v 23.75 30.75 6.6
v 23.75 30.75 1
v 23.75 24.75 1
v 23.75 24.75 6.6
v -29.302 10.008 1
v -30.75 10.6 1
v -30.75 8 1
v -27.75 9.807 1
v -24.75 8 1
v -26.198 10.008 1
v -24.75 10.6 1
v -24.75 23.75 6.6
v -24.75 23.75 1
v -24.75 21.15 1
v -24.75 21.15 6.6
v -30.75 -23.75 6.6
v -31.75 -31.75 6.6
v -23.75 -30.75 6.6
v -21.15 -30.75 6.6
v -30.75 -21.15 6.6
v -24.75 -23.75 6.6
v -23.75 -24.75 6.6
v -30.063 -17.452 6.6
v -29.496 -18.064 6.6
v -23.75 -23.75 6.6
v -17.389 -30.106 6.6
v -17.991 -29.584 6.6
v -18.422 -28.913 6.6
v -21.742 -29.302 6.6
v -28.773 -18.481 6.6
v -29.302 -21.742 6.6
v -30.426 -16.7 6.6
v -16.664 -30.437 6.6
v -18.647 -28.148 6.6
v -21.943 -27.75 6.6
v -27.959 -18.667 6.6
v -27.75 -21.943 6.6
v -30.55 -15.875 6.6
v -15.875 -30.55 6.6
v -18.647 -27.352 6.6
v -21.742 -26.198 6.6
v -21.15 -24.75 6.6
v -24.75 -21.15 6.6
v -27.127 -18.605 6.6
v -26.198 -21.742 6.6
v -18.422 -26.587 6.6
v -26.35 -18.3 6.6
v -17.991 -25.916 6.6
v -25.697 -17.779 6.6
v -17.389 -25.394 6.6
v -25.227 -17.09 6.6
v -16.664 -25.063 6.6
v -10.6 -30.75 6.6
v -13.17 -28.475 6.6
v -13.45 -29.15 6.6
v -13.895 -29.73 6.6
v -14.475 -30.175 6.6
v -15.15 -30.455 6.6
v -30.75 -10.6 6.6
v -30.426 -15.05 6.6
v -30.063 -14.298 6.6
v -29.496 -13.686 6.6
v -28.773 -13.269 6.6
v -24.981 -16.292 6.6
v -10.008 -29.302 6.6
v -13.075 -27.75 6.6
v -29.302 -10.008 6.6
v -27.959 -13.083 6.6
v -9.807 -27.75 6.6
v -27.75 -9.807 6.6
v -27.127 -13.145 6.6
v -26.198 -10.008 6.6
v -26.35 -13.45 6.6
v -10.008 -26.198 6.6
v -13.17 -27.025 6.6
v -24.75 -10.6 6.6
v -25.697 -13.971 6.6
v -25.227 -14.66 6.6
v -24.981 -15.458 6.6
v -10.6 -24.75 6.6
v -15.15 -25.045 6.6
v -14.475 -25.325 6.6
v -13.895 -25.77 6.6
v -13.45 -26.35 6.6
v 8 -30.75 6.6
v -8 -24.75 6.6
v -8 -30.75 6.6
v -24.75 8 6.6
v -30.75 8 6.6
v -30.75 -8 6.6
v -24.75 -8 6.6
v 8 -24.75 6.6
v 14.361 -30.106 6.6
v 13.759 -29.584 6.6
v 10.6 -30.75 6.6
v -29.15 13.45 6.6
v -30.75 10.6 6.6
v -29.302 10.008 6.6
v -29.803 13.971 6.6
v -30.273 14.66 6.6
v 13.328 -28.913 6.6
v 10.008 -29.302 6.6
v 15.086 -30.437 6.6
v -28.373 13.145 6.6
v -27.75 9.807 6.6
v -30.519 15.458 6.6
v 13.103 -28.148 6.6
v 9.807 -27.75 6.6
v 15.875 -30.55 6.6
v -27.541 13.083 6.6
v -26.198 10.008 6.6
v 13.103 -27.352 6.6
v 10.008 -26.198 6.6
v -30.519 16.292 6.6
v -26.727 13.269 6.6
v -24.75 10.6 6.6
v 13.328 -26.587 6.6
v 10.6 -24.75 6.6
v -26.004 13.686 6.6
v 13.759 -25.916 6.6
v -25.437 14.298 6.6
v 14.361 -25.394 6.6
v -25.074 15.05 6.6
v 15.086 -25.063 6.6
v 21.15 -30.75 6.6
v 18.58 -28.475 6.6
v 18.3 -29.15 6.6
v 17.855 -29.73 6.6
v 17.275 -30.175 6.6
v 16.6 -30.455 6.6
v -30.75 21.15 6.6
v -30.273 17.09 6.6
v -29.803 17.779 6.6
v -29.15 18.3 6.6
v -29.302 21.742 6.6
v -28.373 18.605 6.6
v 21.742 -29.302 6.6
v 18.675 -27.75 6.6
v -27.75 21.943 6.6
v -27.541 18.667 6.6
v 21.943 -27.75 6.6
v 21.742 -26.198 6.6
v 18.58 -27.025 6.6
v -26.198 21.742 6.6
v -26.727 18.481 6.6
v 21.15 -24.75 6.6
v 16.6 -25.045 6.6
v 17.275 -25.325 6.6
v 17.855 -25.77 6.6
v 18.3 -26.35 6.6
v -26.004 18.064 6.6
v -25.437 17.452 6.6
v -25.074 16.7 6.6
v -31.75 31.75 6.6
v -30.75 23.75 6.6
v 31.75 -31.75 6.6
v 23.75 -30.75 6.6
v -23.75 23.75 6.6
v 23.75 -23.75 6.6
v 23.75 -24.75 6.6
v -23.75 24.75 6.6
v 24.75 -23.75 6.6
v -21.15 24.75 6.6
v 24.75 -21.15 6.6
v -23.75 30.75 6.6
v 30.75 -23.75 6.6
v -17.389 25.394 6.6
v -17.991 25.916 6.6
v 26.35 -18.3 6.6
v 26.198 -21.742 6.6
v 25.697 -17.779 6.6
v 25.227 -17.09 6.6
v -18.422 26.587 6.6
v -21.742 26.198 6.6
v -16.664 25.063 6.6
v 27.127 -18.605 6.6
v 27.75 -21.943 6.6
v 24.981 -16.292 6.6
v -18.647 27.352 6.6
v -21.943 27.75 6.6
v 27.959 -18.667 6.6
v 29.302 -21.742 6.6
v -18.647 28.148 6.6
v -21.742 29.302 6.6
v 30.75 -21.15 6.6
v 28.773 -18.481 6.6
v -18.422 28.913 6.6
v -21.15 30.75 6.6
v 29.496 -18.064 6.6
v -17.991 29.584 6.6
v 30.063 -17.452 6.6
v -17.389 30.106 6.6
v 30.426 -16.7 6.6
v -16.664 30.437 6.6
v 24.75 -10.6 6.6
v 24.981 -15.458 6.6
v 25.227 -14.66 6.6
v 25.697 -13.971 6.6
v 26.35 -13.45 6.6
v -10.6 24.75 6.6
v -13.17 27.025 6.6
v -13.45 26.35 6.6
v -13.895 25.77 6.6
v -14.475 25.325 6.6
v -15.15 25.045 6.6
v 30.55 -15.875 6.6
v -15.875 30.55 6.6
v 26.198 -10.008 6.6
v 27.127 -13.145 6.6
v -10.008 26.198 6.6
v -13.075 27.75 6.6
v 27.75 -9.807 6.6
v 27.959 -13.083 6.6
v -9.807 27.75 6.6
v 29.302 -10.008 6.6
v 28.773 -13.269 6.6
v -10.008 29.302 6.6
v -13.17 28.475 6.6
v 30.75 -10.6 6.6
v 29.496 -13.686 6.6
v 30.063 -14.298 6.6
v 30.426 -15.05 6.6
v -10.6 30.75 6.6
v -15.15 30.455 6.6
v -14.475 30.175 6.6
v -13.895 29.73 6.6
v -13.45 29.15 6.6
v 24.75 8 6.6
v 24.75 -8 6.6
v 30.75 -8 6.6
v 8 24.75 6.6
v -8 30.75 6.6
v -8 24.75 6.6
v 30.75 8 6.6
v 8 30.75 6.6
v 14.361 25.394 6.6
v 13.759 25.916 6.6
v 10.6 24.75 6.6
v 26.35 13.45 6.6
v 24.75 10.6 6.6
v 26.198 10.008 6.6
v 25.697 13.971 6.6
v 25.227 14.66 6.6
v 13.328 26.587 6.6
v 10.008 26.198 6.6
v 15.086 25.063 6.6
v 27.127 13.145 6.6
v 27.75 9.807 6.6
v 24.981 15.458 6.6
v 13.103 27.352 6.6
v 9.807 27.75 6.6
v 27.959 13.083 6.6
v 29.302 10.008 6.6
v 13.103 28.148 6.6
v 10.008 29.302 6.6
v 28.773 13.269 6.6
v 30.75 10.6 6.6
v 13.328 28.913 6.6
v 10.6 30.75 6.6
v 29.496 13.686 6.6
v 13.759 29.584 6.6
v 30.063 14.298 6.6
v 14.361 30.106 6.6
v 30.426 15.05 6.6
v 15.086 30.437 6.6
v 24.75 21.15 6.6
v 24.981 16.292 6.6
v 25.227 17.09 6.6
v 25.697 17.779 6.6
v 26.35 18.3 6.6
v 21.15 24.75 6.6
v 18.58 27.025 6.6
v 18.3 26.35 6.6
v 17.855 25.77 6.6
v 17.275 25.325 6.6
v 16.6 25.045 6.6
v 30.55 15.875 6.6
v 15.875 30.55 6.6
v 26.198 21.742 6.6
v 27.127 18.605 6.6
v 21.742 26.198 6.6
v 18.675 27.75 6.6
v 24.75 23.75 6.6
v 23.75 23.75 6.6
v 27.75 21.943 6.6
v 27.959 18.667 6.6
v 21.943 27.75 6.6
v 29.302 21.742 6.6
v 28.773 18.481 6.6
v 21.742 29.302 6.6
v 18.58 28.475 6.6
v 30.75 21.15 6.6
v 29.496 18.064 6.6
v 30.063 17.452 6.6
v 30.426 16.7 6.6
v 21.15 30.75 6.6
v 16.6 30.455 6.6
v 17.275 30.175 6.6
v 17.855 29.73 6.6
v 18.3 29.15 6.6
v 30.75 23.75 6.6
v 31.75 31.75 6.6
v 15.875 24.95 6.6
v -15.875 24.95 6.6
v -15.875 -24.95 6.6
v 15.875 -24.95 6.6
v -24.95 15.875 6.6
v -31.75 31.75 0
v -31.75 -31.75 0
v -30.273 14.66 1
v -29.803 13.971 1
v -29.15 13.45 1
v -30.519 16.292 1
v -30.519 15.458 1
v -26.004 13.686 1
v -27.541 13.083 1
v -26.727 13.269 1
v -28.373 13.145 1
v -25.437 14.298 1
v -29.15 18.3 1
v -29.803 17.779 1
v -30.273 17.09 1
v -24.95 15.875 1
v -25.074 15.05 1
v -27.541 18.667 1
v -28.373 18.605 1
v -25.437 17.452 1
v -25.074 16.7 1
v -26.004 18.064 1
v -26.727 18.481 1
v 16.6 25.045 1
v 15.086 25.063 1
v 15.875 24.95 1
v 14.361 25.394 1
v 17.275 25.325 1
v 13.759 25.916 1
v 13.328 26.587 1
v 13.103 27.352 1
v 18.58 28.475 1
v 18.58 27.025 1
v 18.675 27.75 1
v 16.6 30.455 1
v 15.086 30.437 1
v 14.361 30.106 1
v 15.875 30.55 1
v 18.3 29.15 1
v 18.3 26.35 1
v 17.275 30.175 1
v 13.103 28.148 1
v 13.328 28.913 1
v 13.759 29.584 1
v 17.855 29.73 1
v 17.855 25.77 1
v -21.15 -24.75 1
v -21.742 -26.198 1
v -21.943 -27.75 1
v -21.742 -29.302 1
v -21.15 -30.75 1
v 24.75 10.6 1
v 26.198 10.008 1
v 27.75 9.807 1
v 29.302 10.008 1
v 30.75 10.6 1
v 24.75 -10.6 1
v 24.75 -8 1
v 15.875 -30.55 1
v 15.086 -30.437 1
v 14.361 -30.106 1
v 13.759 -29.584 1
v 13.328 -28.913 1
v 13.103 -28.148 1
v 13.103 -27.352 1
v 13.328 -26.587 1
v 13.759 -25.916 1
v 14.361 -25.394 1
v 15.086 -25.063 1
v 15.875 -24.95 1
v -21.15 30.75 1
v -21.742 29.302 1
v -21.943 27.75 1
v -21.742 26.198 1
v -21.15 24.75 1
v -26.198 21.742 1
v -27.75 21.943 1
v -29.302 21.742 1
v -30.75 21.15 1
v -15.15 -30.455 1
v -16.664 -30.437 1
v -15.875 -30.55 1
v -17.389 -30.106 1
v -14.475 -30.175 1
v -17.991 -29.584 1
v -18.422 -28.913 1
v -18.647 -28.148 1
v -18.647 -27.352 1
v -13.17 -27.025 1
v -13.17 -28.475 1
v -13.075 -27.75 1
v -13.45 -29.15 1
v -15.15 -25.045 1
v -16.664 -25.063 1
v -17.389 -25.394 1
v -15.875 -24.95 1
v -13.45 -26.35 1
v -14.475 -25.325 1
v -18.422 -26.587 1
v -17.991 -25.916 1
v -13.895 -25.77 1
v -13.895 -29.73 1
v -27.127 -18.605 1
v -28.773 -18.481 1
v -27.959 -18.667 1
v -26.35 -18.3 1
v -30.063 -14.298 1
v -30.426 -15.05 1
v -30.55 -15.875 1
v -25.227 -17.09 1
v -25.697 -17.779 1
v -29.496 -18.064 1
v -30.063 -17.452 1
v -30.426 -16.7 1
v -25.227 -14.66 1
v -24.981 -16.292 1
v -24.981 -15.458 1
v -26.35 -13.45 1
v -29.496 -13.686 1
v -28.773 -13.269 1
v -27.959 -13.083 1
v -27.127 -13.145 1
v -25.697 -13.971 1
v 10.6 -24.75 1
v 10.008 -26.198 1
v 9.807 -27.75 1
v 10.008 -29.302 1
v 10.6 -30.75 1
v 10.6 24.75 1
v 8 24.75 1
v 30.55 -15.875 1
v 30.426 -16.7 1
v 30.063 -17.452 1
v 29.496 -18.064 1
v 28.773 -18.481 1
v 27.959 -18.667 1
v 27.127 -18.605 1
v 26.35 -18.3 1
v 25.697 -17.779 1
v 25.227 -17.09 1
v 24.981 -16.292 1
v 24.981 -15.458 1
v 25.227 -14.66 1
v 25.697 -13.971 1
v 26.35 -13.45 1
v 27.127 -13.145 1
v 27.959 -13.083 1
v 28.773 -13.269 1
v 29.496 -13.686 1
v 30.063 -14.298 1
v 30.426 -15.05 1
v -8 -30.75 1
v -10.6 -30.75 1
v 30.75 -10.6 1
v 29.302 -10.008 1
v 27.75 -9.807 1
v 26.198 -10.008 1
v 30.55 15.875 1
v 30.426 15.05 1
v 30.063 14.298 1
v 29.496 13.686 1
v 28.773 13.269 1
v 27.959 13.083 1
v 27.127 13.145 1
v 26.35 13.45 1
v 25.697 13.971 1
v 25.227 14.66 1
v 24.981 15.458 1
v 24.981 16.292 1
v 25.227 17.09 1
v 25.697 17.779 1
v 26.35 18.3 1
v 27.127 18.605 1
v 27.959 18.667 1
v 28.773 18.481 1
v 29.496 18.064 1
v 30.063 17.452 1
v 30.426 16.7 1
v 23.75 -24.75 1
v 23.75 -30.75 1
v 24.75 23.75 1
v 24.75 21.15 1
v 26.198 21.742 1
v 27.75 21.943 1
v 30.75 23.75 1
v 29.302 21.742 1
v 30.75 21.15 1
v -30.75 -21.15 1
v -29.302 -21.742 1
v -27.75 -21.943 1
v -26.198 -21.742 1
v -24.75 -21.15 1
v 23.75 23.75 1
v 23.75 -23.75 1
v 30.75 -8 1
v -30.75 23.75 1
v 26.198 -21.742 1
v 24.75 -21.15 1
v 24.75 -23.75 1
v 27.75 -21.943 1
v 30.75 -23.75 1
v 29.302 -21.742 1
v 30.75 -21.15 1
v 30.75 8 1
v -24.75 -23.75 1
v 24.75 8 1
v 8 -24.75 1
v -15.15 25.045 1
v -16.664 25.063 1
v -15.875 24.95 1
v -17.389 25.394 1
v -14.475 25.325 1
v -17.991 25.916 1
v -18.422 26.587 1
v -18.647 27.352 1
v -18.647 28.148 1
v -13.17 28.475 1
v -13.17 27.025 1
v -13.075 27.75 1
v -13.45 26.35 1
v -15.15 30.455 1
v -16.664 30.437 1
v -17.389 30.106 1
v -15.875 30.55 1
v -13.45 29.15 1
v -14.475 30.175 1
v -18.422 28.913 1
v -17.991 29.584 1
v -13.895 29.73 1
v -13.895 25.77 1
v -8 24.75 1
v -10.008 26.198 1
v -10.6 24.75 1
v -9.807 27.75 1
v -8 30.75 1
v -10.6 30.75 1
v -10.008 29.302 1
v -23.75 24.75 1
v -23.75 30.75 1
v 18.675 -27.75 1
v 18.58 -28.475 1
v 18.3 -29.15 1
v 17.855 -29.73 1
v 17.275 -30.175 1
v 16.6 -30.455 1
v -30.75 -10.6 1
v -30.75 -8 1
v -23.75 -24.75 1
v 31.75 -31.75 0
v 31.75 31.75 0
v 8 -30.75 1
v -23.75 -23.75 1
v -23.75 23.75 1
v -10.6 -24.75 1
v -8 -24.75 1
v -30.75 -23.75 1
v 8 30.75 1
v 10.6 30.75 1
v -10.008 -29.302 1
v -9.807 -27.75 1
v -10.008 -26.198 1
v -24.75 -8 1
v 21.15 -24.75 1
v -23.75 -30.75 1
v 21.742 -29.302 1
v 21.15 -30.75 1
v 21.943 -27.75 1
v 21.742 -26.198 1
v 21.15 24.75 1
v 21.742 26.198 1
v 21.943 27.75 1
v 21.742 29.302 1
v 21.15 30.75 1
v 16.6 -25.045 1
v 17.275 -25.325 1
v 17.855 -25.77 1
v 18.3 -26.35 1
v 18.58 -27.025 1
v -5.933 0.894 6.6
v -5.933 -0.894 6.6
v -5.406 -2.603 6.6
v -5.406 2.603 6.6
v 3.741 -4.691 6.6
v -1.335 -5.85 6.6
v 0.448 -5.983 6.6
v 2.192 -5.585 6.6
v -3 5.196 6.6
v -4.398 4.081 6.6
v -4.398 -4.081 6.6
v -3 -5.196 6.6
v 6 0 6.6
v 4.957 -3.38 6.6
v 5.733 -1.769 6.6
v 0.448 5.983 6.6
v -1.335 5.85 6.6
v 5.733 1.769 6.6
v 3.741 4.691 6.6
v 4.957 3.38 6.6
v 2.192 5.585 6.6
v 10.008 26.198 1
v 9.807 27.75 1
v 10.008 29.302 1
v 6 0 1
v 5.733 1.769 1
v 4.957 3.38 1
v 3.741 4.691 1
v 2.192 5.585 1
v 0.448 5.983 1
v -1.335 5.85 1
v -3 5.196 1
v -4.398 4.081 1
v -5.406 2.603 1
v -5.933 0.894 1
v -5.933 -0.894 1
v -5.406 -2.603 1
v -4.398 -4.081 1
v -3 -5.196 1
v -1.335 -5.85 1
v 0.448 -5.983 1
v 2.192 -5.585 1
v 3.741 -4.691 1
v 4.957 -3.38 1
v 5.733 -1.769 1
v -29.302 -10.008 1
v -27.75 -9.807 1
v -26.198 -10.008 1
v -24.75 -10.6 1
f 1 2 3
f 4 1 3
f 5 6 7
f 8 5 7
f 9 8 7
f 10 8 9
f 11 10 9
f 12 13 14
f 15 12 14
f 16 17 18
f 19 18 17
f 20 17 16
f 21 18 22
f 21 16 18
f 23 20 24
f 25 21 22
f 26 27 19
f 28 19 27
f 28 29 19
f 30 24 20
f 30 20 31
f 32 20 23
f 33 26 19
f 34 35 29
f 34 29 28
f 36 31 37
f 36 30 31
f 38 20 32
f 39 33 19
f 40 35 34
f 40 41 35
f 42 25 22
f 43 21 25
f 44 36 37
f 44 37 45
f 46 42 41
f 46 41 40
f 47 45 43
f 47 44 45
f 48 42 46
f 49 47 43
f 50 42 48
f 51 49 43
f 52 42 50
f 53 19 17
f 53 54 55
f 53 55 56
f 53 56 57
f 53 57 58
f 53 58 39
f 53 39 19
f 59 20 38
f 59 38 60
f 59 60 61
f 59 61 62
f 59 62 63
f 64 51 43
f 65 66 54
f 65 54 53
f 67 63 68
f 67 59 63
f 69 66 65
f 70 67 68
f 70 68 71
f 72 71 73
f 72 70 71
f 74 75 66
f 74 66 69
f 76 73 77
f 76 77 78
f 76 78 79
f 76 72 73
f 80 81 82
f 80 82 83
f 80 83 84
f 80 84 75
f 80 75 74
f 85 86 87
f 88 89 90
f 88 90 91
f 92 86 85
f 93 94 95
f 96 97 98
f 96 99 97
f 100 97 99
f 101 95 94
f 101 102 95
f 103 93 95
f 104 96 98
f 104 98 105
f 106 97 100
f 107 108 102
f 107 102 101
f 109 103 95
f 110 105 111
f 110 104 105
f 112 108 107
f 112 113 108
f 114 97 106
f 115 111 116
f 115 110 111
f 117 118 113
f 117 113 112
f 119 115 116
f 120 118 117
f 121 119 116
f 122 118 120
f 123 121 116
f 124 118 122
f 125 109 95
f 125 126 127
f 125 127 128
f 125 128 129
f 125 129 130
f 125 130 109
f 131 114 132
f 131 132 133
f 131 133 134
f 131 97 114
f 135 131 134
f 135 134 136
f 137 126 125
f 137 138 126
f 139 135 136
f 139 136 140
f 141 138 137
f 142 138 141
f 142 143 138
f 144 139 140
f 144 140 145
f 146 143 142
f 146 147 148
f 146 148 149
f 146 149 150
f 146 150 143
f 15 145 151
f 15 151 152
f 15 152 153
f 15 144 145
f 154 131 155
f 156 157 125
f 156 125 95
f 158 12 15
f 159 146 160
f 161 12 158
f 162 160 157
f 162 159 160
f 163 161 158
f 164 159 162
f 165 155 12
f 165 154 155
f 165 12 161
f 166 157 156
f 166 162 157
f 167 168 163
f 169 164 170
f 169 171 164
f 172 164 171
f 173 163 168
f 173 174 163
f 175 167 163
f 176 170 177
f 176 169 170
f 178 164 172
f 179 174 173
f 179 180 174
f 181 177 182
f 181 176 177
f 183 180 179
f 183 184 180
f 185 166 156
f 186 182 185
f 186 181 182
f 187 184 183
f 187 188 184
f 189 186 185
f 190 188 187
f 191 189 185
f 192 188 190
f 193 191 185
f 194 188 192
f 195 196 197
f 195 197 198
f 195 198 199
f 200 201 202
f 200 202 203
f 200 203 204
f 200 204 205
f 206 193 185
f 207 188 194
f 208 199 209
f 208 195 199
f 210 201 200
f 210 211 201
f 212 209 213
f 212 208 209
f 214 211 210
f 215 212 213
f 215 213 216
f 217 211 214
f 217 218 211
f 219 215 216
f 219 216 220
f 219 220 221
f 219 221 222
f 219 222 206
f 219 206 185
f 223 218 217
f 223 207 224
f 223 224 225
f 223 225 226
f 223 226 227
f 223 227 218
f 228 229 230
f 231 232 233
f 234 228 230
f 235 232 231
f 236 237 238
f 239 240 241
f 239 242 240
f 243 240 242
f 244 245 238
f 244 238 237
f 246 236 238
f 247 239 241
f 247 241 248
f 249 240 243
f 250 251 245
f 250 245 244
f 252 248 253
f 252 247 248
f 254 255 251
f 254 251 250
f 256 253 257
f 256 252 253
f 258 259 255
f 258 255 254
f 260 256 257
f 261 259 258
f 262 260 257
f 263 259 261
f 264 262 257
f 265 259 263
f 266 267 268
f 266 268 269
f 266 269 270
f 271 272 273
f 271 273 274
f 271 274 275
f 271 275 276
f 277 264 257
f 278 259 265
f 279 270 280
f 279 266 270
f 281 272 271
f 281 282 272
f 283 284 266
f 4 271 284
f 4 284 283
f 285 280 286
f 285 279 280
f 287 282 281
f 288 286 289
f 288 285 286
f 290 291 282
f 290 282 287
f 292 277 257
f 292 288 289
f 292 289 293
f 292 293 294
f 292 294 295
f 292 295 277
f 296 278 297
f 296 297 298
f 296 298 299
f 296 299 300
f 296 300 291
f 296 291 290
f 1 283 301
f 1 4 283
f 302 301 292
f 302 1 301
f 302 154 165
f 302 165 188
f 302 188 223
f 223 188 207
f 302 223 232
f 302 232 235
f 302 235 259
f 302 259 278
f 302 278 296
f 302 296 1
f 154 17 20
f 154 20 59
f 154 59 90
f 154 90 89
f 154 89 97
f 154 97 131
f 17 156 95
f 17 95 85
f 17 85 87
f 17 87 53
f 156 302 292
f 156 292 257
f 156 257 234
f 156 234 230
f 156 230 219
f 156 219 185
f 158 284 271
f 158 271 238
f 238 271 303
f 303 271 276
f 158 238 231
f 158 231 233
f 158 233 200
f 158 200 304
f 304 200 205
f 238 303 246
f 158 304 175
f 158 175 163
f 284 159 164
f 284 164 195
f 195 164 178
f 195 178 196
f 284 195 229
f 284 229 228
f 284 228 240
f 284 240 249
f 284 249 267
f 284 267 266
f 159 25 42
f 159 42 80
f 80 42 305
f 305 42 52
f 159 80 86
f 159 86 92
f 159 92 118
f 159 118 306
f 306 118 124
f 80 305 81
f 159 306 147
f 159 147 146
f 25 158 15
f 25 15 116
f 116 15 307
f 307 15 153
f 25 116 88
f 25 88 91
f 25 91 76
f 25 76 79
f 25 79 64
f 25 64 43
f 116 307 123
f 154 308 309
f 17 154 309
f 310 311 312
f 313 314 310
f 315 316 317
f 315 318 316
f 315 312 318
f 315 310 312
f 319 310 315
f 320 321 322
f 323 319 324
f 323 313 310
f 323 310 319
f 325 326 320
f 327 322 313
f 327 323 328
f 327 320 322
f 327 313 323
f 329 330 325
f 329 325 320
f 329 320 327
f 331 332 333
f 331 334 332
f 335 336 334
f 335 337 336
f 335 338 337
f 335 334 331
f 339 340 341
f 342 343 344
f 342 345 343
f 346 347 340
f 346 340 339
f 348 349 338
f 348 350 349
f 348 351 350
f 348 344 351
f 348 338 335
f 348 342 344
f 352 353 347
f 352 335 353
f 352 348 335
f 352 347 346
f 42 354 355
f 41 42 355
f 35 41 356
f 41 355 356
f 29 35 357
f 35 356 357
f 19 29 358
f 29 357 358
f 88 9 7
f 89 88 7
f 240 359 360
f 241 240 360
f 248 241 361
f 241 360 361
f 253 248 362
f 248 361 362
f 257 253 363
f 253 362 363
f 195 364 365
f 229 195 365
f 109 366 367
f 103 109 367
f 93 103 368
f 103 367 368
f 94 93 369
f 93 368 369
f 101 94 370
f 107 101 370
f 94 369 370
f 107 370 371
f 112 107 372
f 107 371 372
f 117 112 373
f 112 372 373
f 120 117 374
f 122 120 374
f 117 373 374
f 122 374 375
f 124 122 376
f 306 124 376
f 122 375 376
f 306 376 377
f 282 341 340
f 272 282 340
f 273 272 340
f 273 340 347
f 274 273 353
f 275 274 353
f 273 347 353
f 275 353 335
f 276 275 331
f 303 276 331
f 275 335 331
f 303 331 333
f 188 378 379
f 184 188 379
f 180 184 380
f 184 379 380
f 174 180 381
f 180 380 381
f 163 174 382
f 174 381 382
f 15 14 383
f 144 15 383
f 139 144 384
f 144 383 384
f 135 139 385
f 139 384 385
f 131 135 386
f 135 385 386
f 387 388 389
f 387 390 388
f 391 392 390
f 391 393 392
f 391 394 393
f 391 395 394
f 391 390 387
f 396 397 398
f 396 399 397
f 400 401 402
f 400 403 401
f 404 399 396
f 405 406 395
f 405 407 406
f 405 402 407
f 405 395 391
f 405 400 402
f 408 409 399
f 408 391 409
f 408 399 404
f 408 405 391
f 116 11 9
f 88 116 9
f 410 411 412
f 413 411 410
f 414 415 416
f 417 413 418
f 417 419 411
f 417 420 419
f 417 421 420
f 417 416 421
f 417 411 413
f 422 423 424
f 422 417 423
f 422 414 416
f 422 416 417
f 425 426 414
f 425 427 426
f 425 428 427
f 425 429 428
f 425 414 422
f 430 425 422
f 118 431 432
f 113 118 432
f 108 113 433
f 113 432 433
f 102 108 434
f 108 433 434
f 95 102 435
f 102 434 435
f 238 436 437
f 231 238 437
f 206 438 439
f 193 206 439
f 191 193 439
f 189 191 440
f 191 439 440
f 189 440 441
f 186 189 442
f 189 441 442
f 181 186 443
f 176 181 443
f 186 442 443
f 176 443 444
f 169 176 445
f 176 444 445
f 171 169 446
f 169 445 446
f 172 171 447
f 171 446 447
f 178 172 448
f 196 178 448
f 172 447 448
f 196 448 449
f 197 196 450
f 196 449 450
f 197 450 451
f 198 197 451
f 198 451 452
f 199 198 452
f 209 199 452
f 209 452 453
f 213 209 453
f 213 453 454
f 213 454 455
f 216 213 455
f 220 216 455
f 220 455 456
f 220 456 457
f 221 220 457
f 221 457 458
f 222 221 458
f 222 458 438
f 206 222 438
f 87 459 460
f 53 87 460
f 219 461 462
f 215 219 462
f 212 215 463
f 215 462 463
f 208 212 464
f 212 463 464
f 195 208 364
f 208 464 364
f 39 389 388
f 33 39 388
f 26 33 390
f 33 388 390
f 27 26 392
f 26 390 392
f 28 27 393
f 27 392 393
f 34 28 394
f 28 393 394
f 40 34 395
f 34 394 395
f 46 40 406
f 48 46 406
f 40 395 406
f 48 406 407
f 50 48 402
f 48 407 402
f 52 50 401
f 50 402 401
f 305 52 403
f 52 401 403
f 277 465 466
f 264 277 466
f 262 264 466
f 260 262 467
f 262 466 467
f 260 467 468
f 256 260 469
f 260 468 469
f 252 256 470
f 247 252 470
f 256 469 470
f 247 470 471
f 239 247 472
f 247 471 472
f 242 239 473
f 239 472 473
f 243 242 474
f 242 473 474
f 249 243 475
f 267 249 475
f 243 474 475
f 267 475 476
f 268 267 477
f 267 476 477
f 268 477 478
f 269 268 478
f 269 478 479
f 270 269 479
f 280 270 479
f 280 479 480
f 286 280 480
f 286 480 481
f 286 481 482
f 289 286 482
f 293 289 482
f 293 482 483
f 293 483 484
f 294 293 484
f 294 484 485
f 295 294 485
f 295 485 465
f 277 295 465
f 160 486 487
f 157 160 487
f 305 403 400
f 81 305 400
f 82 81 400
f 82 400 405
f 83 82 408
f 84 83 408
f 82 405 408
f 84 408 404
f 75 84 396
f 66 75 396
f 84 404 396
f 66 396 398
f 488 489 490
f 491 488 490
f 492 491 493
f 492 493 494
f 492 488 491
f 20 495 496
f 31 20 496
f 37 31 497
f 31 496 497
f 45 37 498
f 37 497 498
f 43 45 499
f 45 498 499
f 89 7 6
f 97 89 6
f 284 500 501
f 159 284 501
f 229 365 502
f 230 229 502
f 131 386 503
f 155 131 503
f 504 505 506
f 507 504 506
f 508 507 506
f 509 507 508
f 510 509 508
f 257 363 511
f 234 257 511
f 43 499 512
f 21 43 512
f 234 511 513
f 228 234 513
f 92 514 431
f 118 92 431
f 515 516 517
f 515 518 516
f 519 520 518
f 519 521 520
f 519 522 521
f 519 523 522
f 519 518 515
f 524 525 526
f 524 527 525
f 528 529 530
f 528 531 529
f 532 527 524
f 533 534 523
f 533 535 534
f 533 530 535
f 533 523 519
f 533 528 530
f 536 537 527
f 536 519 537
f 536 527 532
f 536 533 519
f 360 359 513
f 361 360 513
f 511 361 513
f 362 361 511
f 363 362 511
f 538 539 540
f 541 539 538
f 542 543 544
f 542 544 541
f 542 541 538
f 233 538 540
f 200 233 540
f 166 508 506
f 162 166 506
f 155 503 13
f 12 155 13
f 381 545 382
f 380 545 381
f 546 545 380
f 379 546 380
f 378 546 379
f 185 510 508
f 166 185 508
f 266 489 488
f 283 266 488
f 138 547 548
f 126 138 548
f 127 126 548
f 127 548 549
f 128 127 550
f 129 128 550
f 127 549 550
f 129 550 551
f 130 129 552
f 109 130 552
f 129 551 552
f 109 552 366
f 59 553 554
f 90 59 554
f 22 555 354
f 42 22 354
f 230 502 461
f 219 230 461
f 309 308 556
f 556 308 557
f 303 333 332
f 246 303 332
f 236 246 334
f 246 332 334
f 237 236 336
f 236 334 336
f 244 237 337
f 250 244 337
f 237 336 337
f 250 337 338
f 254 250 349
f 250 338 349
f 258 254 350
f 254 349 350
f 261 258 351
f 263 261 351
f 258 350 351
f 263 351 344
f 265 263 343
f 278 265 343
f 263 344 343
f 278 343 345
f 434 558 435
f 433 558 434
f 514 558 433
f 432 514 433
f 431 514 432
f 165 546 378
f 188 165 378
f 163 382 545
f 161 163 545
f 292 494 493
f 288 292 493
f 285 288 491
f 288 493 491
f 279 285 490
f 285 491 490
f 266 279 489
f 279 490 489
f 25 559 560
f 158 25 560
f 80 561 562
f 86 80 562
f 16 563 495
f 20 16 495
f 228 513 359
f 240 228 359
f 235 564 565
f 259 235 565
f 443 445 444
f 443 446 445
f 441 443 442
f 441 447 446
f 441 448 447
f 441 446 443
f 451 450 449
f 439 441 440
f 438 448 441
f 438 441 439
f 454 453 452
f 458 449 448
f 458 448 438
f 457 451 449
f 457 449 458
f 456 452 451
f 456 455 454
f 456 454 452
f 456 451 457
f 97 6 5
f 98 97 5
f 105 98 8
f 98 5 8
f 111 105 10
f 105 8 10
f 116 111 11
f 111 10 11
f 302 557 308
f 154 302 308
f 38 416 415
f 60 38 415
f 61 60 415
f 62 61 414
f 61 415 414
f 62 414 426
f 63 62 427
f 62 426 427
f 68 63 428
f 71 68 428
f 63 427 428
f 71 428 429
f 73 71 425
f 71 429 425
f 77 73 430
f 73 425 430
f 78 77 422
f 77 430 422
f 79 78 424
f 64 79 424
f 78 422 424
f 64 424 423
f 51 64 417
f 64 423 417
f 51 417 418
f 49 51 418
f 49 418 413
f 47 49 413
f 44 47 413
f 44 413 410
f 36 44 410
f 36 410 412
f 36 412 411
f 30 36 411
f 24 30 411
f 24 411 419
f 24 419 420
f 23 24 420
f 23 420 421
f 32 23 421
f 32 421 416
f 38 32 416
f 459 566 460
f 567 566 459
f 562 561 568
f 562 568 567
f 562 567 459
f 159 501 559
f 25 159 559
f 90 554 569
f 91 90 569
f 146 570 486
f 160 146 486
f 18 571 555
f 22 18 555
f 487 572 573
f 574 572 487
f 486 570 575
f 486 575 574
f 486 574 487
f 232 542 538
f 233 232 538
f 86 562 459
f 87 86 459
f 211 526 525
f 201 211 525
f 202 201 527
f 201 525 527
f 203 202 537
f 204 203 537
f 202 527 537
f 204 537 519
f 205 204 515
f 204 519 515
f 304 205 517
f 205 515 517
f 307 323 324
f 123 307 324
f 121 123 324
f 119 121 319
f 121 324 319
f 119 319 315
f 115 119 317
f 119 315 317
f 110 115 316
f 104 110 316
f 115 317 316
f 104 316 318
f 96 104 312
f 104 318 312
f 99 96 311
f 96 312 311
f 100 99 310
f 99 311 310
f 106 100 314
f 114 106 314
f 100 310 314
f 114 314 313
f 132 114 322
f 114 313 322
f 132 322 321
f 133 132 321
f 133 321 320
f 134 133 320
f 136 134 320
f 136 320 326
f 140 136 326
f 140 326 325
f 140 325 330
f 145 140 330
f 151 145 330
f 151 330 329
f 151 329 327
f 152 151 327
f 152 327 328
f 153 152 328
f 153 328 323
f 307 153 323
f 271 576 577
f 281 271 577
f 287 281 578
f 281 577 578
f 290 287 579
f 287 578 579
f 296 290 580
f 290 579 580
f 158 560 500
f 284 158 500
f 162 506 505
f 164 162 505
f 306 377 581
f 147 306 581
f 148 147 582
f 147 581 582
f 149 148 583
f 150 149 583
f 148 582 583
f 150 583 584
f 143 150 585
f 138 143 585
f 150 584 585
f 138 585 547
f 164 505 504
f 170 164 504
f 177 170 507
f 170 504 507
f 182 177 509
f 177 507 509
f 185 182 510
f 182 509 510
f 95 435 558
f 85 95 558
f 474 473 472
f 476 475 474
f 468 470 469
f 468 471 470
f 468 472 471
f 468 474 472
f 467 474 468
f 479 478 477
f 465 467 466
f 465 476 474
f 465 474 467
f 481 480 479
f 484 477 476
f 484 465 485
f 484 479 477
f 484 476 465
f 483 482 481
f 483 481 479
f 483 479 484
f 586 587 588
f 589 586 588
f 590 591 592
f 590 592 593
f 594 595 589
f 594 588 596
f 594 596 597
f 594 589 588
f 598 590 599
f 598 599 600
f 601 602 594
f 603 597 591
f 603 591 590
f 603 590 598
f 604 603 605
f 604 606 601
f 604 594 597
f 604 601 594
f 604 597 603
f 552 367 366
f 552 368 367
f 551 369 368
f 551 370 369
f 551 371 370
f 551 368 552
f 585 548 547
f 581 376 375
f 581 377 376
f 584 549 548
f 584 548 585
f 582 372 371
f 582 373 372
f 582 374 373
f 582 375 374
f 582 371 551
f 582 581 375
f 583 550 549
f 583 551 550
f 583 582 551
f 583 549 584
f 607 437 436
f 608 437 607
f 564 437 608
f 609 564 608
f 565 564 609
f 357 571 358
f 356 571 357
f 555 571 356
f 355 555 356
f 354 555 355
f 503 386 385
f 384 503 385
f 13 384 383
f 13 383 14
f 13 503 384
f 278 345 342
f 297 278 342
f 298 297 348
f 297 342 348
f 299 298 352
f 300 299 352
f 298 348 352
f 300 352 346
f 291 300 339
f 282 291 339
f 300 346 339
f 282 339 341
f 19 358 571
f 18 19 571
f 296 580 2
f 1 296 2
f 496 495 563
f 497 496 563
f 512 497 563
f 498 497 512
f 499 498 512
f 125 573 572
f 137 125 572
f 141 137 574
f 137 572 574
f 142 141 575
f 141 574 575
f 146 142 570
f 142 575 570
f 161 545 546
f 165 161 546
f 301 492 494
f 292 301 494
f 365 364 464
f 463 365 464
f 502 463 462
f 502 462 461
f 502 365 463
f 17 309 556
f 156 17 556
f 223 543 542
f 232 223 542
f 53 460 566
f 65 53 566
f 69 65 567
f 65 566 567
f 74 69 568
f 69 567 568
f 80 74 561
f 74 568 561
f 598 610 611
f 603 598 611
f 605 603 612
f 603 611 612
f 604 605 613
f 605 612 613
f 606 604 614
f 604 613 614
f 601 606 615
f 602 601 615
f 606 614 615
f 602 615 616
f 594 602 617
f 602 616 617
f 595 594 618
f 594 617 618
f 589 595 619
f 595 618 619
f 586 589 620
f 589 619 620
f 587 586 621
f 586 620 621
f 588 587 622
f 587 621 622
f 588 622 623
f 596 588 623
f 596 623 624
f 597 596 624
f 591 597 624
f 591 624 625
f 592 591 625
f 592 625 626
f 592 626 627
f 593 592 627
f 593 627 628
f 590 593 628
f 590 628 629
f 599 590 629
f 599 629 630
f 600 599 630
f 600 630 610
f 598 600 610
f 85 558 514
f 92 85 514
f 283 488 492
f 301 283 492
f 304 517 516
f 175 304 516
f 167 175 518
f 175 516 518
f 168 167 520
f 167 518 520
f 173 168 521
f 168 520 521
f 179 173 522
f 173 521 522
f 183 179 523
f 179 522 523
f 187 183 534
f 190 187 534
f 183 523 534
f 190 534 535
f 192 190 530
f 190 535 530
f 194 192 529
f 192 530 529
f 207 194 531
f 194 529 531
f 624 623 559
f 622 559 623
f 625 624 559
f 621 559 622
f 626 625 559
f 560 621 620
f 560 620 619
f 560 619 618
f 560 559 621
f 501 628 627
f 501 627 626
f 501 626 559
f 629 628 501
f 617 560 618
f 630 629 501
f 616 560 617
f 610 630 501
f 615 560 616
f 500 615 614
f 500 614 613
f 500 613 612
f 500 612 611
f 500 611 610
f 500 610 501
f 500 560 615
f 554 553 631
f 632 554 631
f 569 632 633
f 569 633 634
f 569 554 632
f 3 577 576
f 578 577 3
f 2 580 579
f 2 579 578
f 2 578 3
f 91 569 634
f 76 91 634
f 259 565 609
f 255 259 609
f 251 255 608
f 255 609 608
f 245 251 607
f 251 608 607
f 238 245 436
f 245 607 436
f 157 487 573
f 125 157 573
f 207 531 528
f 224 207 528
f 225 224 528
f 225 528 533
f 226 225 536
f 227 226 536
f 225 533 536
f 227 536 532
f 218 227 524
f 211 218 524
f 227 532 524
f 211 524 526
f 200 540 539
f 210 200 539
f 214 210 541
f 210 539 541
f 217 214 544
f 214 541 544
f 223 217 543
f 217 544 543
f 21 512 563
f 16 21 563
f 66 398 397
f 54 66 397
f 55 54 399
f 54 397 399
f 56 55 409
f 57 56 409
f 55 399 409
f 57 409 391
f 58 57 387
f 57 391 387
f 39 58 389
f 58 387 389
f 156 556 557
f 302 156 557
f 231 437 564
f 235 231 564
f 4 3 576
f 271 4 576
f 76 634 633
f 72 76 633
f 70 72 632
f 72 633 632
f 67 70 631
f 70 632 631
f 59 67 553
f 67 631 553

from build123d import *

# Parameters (mm, degrees)
F0_R     = 6
F0_W     = 7.875
F0_H     = 7.875
F1_DEPTH = 1
F2_DEPTH = 6.6


with BuildPart() as f1:
    # F0 (on Top) → F1 (new body)
    with BuildSketch(Plane.XY):
        Polygon((15.875, 23.75), (0, 23.75), (-15.875, 23.75), (-15.875, 15.875), (-23.75, 15.875), (-23.75, -15.875), (-23.75, -23.75), (-15.875, -23.75), (15.875, -23.75), (23.75, -23.75), (23.75, -15.875), (23.75, 15.875), (23.75, 23.75), align=None)
        Circle(F0_R, mode=Mode.SUBTRACT)
        with BuildLine():
            Line((-23.75, -15.875), (-23.75, 15.875))
            Line((-23.75, 15.875), (-24.95, 15.875))
            ThreePointArc((-24.95, 15.875), (-27.75, 13.075), (-30.55, 15.875))
            Line((-30.55, 15.875), (-31.75, 15.875))
            Line((-31.75, 15.875), (-31.75, -15.875))
            Line((-31.75, -15.875), (-30.55, -15.875))
            ThreePointArc((-30.55, -15.875), (-27.75, -13.075), (-24.95, -15.875))
            Line((-24.95, -15.875), (-23.75, -15.875))
        make_face()
        with BuildLine():
            Line((-24.75, -8), (-24.75, -10.6))
            ThreePointArc((-24.75, -10.6), (-27.75, -9.8065879342), (-30.75, -10.6))
            Line((-30.75, -10.6), (-30.75, -8))
            Line((-30.75, -8), (-24.75, -8))
        make_face(mode=Mode.SUBTRACT)
        with BuildLine():
            ThreePointArc((-30.75, 10.6), (-27.75, 9.8065879342), (-24.75, 10.6))
            Line((-24.75, 10.6), (-24.75, 8))
            Line((-24.75, 8), (-30.75, 8))
            Line((-30.75, 8), (-30.75, 10.6))
        make_face(mode=Mode.SUBTRACT)
        with BuildLine():
            Line((-15.875, -31.75), (15.875, -31.75))
            Line((15.875, -31.75), (15.875, -30.55))
            ThreePointArc((15.875, -30.55), (13.075, -27.75), (15.875, -24.95))
            Line((15.875, -24.95), (15.875, -23.75))
            Line((15.875, -23.75), (-15.875, -23.75))
            Line((-15.875, -23.75), (-15.875, -24.95))
            ThreePointArc((-15.875, -24.95), (-13.8951010127, -25.7701010127), (-13.075, -27.75))
            ThreePointArc((-13.075, -27.75), (-13.8951010127, -29.7298989873), (-15.875, -30.55))
            Line((-15.875, -30.55), (-15.875, -31.75))
        make_face()
        with BuildLine():
            Line((-8, -30.75), (-10.6, -30.75))
            ThreePointArc((-10.6, -30.75), (-9.8065879342, -27.75), (-10.6, -24.75))
            Line((-10.6, -24.75), (-8, -24.75))
            Line((-8, -24.75), (-8, -30.75))
        make_face(mode=Mode.SUBTRACT)
        with BuildLine():
            Line((8, -30.75), (8, -24.75))
            Line((8, -24.75), (10.6, -24.75))
            ThreePointArc((10.6, -24.75), (9.8065879342, -27.75), (10.6, -30.75))
            Line((10.6, -30.75), (8, -30.75))
        make_face(mode=Mode.SUBTRACT)
        with BuildLine():
            Line((31.75, -15.875), (31.75, 15.875))
            Line((31.75, 15.875), (30.55, 15.875))
            ThreePointArc((30.55, 15.875), (27.75, 13.075), (24.95, 15.875))
            Line((24.95, 15.875), (23.75, 15.875))
            Line((23.75, 15.875), (23.75, -15.875))
            Line((23.75, -15.875), (24.95, -15.875))
            ThreePointArc((24.95, -15.875), (27.75, -13.075), (30.55, -15.875))
            Line((30.55, -15.875), (31.75, -15.875))
        make_face()
        with BuildLine():
            ThreePointArc((30.75, -10.6), (27.75, -9.8065879342), (24.75, -10.6))
            Line((24.75, -10.6), (24.75, -8))
            Line((24.75, -8), (30.75, -8))
            Line((30.75, -8), (30.75, -10.6))
        make_face(mode=Mode.SUBTRACT)
        with BuildLine():
            Line((24.75, 8), (24.75, 10.6))
            ThreePointArc((24.75, 10.6), (27.75, 9.8065879342), (30.75, 10.6))
            Line((30.75, 10.6), (30.75, 8))
            Line((30.75, 8), (24.75, 8))
        make_face(mode=Mode.SUBTRACT)
        with BuildLine():
            Line((-31.75, -31.75), (-15.875, -31.75))
            Line((-15.875, -31.75), (-15.875, -30.55))
            ThreePointArc((-15.875, -30.55), (-18.675, -27.75), (-15.875, -24.95))
            Line((-15.875, -24.95), (-15.875, -23.75))
            Line((-15.875, -23.75), (-23.75, -23.75))
            Line((-23.75, -23.75), (-23.75, -15.875))
            Line((-23.75, -15.875), (-24.95, -15.875))
            ThreePointArc((-24.95, -15.875), (-27.75, -18.675), (-30.55, -15.875))
            Line((-30.55, -15.875), (-31.75, -15.875))
            Line((-31.75, -15.875), (-31.75, -31.75))
        make_face()
        with BuildLine():
            Line((-23.75, -30.75), (-23.75, -24.75))
            Line((-23.75, -24.75), (-21.15, -24.75))
            ThreePointArc((-21.15, -24.75), (-21.9434120658, -27.75), (-21.15, -30.75))
            Line((-21.15, -30.75), (-23.75, -30.75))
        make_face(mode=Mode.SUBTRACT)
        with BuildLine():
            ThreePointArc((-30.75, -21.15), (-27.75, -21.9434120658), (-24.75, -21.15))
            Line((-24.75, -21.15), (-24.75, -23.75))
            Line((-24.75, -23.75), (-30.75, -23.75))
            Line((-30.75, -23.75), (-30.75, -21.15))
        make_face(mode=Mode.SUBTRACT)
        with BuildLine():
            Line((31.75, -31.75), (31.75, -15.875))
            Line((31.75, -15.875), (30.55, -15.875))
            ThreePointArc((30.55, -15.875), (27.75, -18.675), (24.95, -15.875))
            Line((24.95, -15.875), (23.75, -15.875))
            Line((23.75, -15.875), (23.75, -23.75))
            Line((23.75, -23.75), (15.875, -23.75))
            Line((15.875, -23.75), (15.875, -24.95))
            ThreePointArc((15.875, -24.95), (17.8548989873, -25.7701010127), (18.675, -27.75))
            ThreePointArc((18.675, -27.75), (17.8548989873, -29.7298989873), (15.875, -30.55))
            Line((15.875, -30.55), (15.875, -31.75))
            Line((15.875, -31.75), (31.75, -31.75))
        make_face()
        with BuildLine():
            Line((21.15, -24.75), (23.75, -24.75))
            Line((23.75, -24.75), (23.75, -30.75))
            Line((23.75, -30.75), (21.15, -30.75))
            ThreePointArc((21.15, -30.75), (21.9434120658, -27.75), (21.15, -24.75))
        make_face(mode=Mode.SUBTRACT)
        with BuildLine():
            Line((24.75, -23.75), (24.75, -21.15))
            ThreePointArc((24.75, -21.15), (27.75, -21.9434120658), (30.75, -21.15))
            Line((30.75, -21.15), (30.75, -23.75))
            Line((30.75, -23.75), (24.75, -23.75))
        make_face(mode=Mode.SUBTRACT)
        with BuildLine():
            Line((31.75, 15.875), (31.75, 31.75))
            Line((31.75, 31.75), (15.875, 31.75))
            Line((15.875, 31.75), (15.875, 30.55))
            ThreePointArc((15.875, 30.55), (17.8548989873, 29.7298989873), (18.675, 27.75))
            ThreePointArc((18.675, 27.75), (17.8548989873, 25.7701010127), (15.875, 24.95))
            Line((15.875, 24.95), (15.875, 23.75))
            Line((15.875, 23.75), (23.75, 23.75))
            Line((23.75, 23.75), (23.75, 15.875))
            Line((23.75, 15.875), (24.95, 15.875))
            ThreePointArc((24.95, 15.875), (27.75, 18.675), (30.55, 15.875))
            Line((30.55, 15.875), (31.75, 15.875))
        make_face()
        with BuildLine():
            ThreePointArc((30.75, 21.15), (27.75, 21.9434120658), (24.75, 21.15))
            Line((24.75, 21.15), (24.75, 23.75))
            Line((24.75, 23.75), (30.75, 23.75))
            Line((30.75, 23.75), (30.75, 21.15))
        make_face(mode=Mode.SUBTRACT)
        with BuildLine():
            ThreePointArc((21.15, 24.75), (21.9434120658, 27.75), (21.15, 30.75))
            Line((21.15, 30.75), (23.75, 30.75))
            Line((23.75, 30.75), (23.75, 24.75))
            Line((23.75, 24.75), (21.15, 24.75))
        make_face(mode=Mode.SUBTRACT)
        with BuildLine():
            Line((0, 23.75), (0, 31.75))
            Line((0, 31.75), (-15.875, 31.75))
            Line((-15.875, 31.75), (-15.875, 30.55))
            ThreePointArc((-15.875, 30.55), (-13.8951010127, 29.7298989873), (-13.075, 27.75))
            ThreePointArc((-13.075, 27.75), (-13.8951010127, 25.7701010127), (-15.875, 24.95))
            Line((-15.875, 24.95), (-15.875, 23.75))
            Line((-15.875, 23.75), (0, 23.75))
        make_face()
        with BuildLine():
            ThreePointArc((-10.6, 24.75), (-9.8065879342, 27.75), (-10.6, 30.75))
            Line((-10.6, 30.75), (-8, 30.75))
            Line((-8, 30.75), (-8, 24.75))
            Line((-8, 24.75), (-10.6, 24.75))
        make_face(mode=Mode.SUBTRACT)
        with BuildLine():
            Line((15.875, 30.55), (15.875, 31.75))
            Line((15.875, 31.75), (0, 31.75))
            Line((0, 31.75), (0, 23.75))
            Line((0, 23.75), (15.875, 23.75))
            Line((15.875, 23.75), (15.875, 24.95))
            ThreePointArc((15.875, 24.95), (13.075, 27.75), (15.875, 30.55))
        make_face()
        with BuildLine():
            Line((8, 24.75), (8, 30.75))
            Line((8, 30.75), (10.6, 30.75))
            ThreePointArc((10.6, 30.75), (9.8065879342, 27.75), (10.6, 24.75))
            Line((10.6, 24.75), (8, 24.75))
        make_face(mode=Mode.SUBTRACT)
        Circle(F0_R)
        Polygon((-23.75, 30.75), (-23.75, 31.75), (-31.75, 31.75), (-31.75, 23.75), (-30.75, 23.75), (-24.75, 23.75), (-23.75, 23.75), (-23.75, 24.75), align=None)
        with Locations((-19.8125, 19.8125)):
            Rectangle(F0_W, F0_H)
        with BuildLine():
            Line((-15.875, 30.55), (-15.875, 31.75))
            Line((-15.875, 31.75), (-23.75, 31.75))
            Line((-23.75, 31.75), (-23.75, 30.75))
            Line((-23.75, 30.75), (-21.15, 30.75))
            ThreePointArc((-21.15, 30.75), (-21.9434120658, 27.75), (-21.15, 24.75))
            Line((-21.15, 24.75), (-23.75, 24.75))
            Line((-23.75, 24.75), (-23.75, 23.75))
            Line((-23.75, 23.75), (-15.875, 23.75))
            Line((-15.875, 23.75), (-15.875, 24.95))
            ThreePointArc((-15.875, 24.95), (-18.675, 27.75), (-15.875, 30.55))
        make_face()
        with BuildLine():
            Line((-23.75, 15.875), (-23.75, 23.75))
            Line((-23.75, 23.75), (-24.75, 23.75))
            Line((-24.75, 23.75), (-24.75, 21.15))
            ThreePointArc((-24.75, 21.15), (-27.75, 21.9434120658), (-30.75, 21.15))
            Line((-30.75, 21.15), (-30.75, 23.75))
            Line((-30.75, 23.75), (-31.75, 23.75))
            Line((-31.75, 23.75), (-31.75, 15.875))
            Line((-31.75, 15.875), (-30.55, 15.875))
            ThreePointArc((-30.55, 15.875), (-27.75, 18.675), (-24.95, 15.875))
            Line((-24.95, 15.875), (-23.75, 15.875))
        make_face()
        with BuildLine():
            Line((-21.15, 30.75), (-23.75, 30.75))
            Line((-23.75, 30.75), (-23.75, 24.75))
            Line((-23.75, 24.75), (-21.15, 24.75))
            ThreePointArc((-21.15, 24.75), (-21.9434120658, 27.75), (-21.15, 30.75))
        make_face()
        with BuildLine():
            Line((-24.75, 21.15), (-24.75, 23.75))
            Line((-24.75, 23.75), (-30.75, 23.75))
            Line((-30.75, 23.75), (-30.75, 21.15))
            ThreePointArc((-30.75, 21.15), (-27.75, 21.9434120658), (-24.75, 21.15))
        make_face()
        with BuildLine():
            Line((-24.75, 8), (-24.75, 10.6))
            ThreePointArc((-24.75, 10.6), (-27.75, 9.8065879342), (-30.75, 10.6))
            Line((-30.75, 10.6), (-30.75, 8))
            Line((-30.75, 8), (-24.75, 8))
        make_face()
        with BuildLine():
            Line((-8, 30.75), (-10.6, 30.75))
            ThreePointArc((-10.6, 30.75), (-9.8065879342, 27.75), (-10.6, 24.75))
            Line((-10.6, 24.75), (-8, 24.75))
            Line((-8, 24.75), (-8, 30.75))
        make_face()
        with BuildLine():
            Line((10.6, 30.75), (8, 30.75))
            Line((8, 30.75), (8, 24.75))
            Line((8, 24.75), (10.6, 24.75))
            ThreePointArc((10.6, 24.75), (9.8065879342, 27.75), (10.6, 30.75))
        make_face()
        with BuildLine():
            Line((23.75, 30.75), (21.15, 30.75))
            ThreePointArc((21.15, 30.75), (21.9434120658, 27.75), (21.15, 24.75))
            Line((21.15, 24.75), (23.75, 24.75))
            Line((23.75, 24.75), (23.75, 30.75))
        make_face()
        with BuildLine():
            Line((24.75, 23.75), (24.75, 21.15))
            ThreePointArc((24.75, 21.15), (27.75, 21.9434120658), (30.75, 21.15))
            Line((30.75, 21.15), (30.75, 23.75))
            Line((30.75, 23.75), (24.75, 23.75))
        make_face()
        with BuildLine():
            ThreePointArc((30.75, 10.6), (27.75, 9.8065879342), (24.75, 10.6))
            Line((24.75, 10.6), (24.75, 8))
            Line((24.75, 8), (30.75, 8))
            Line((30.75, 8), (30.75, 10.6))
        make_face()
        with BuildLine():
            Line((23.75, -30.75), (23.75, -24.75))
            Line((23.75, -24.75), (21.15, -24.75))
            ThreePointArc((21.15, -24.75), (21.9434120658, -27.75), (21.15, -30.75))
            Line((21.15, -30.75), (23.75, -30.75))
        make_face()
        with BuildLine():
            Line((10.6, -24.75), (8, -24.75))
            Line((8, -24.75), (8, -30.75))
            Line((8, -30.75), (10.6, -30.75))
            ThreePointArc((10.6, -30.75), (9.8065879342, -27.75), (10.6, -24.75))
        make_face()
        with BuildLine():
            ThreePointArc((-10.6, -24.75), (-9.8065879342, -27.75), (-10.6, -30.75))
            Line((-10.6, -30.75), (-8, -30.75))
            Line((-8, -30.75), (-8, -24.75))
            Line((-8, -24.75), (-10.6, -24.75))
        make_face()
        with BuildLine():
            Line((-21.15, -24.75), (-23.75, -24.75))
            Line((-23.75, -24.75), (-23.75, -30.75))
            Line((-23.75, -30.75), (-21.15, -30.75))
            ThreePointArc((-21.15, -30.75), (-21.9434120658, -27.75), (-21.15, -24.75))
        make_face()
        with BuildLine():
            ThreePointArc((-30.75, -10.6), (-27.75, -9.8065879342), (-24.75, -10.6))
            Line((-24.75, -10.6), (-24.75, -8))
            Line((-24.75, -8), (-30.75, -8))
            Line((-30.75, -8), (-30.75, -10.6))
        make_face()
        with BuildLine():
            Line((-24.75, -23.75), (-24.75, -21.15))
            ThreePointArc((-24.75, -21.15), (-27.75, -21.9434120658), (-30.75, -21.15))
            Line((-30.75, -21.15), (-30.75, -23.75))
            Line((-30.75, -23.75), (-24.75, -23.75))
        make_face()
        with BuildLine():
            ThreePointArc((30.75, -21.15), (27.75, -21.9434120658), (24.75, -21.15))
            Line((24.75, -21.15), (24.75, -23.75))
            Line((24.75, -23.75), (30.75, -23.75))
            Line((30.75, -23.75), (30.75, -21.15))
        make_face()
        with BuildLine():
            Line((24.75, -8), (24.75, -10.6))
            ThreePointArc((24.75, -10.6), (27.75, -9.8065879342), (30.75, -10.6))
            Line((30.75, -10.6), (30.75, -8))
            Line((30.75, -8), (24.75, -8))
        make_face()
        with BuildLine():
            Line((-15.875, 24.95), (-15.875, 30.55))
            ThreePointArc((-15.875, 30.55), (-18.675, 27.75), (-15.875, 24.95))
        make_face()
        with BuildLine():
            ThreePointArc((-13.075, 27.75), (-13.8951010127, 29.7298989873), (-15.875, 30.55))
            Line((-15.875, 30.55), (-15.875, 24.95))
            ThreePointArc((-15.875, 24.95), (-13.8951010127, 25.7701010127), (-13.075, 27.75))
        make_face()
        with BuildLine():
            Line((15.875, 24.95), (15.875, 30.55))
            ThreePointArc((15.875, 30.55), (13.075, 27.75), (15.875, 24.95))
        make_face()
        with BuildLine():
            ThreePointArc((18.675, 27.75), (17.8548989873, 29.7298989873), (15.875, 30.55))
            Line((15.875, 30.55), (15.875, 24.95))
            ThreePointArc((15.875, 24.95), (17.8548989873, 25.7701010127), (18.675, 27.75))
        make_face()
        with BuildLine():
            Line((24.95, 15.875), (30.55, 15.875))
            ThreePointArc((30.55, 15.875), (27.75, 18.675), (24.95, 15.875))
        make_face()
        with BuildLine():
            ThreePointArc((24.95, 15.875), (27.75, 13.075), (30.55, 15.875))
            Line((30.55, 15.875), (24.95, 15.875))
        make_face()
        with BuildLine():
            Line((-30.55, 15.875), (-24.95, 15.875))
            ThreePointArc((-24.95, 15.875), (-27.75, 18.675), (-30.55, 15.875))
        make_face()
        with BuildLine():
            ThreePointArc((-30.55, 15.875), (-27.75, 13.075), (-24.95, 15.875))
            Line((-24.95, 15.875), (-30.55, 15.875))
        make_face()
        with BuildLine():
            Line((-30.55, -15.875), (-24.95, -15.875))
            ThreePointArc((-24.95, -15.875), (-27.75, -13.075), (-30.55, -15.875))
        make_face()
        with BuildLine():
            ThreePointArc((-30.55, -15.875), (-27.75, -18.675), (-24.95, -15.875))
            Line((-24.95, -15.875), (-30.55, -15.875))
        make_face()
        with BuildLine():
            ThreePointArc((-15.875, -24.95), (-18.675, -27.75), (-15.875, -30.55))
            Line((-15.875, -30.55), (-15.875, -24.95))
        make_face()
        with BuildLine():
            Line((-15.875, -24.95), (-15.875, -30.55))
            ThreePointArc((-15.875, -30.55), (-13.8951010127, -29.7298989873), (-13.075, -27.75))
            ThreePointArc((-13.075, -27.75), (-13.8951010127, -25.7701010127), (-15.875, -24.95))
        make_face()
        with BuildLine():
            Line((15.875, -24.95), (15.875, -30.55))
            ThreePointArc((15.875, -30.55), (17.8548989873, -29.7298989873), (18.675, -27.75))
            ThreePointArc((18.675, -27.75), (17.8548989873, -25.7701010127), (15.875, -24.95))
        make_face()
        with BuildLine():
            ThreePointArc((15.875, -24.95), (13.075, -27.75), (15.875, -30.55))
            Line((15.875, -30.55), (15.875, -24.95))
        make_face()
        with BuildLine():
            Line((24.95, -15.875), (30.55, -15.875))
            ThreePointArc((30.55, -15.875), (27.75, -13.075), (24.95, -15.875))
        make_face()
        with BuildLine():
            ThreePointArc((24.95, -15.875), (27.75, -18.675), (30.55, -15.875))
            Line((30.55, -15.875), (24.95, -15.875))
        make_face()
    extrude(amount=F1_DEPTH)

    # F0 (on Top) → F2 (join)
    with BuildSketch(Plane.XY):
        with BuildLine():
            Line((31.75, 15.875), (31.75, 31.75))
            Line((31.75, 31.75), (15.875, 31.75))
            Line((15.875, 31.75), (15.875, 30.55))
            ThreePointArc((15.875, 30.55), (17.8548989873, 29.7298989873), (18.675, 27.75))
            ThreePointArc((18.675, 27.75), (17.8548989873, 25.7701010127), (15.875, 24.95))
            Line((15.875, 24.95), (15.875, 23.75))
            Line((15.875, 23.75), (23.75, 23.75))
            Line((23.75, 23.75), (23.75, 15.875))
            Line((23.75, 15.875), (24.95, 15.875))
            ThreePointArc((24.95, 15.875), (27.75, 18.675), (30.55, 15.875))
            Line((30.55, 15.875), (31.75, 15.875))
        make_face()
        with BuildLine():
            ThreePointArc((30.75, 21.15), (27.75, 21.9434120658), (24.75, 21.15))
            Line((24.75, 21.15), (24.75, 23.75))
            Line((24.75, 23.75), (30.75, 23.75))
            Line((30.75, 23.75), (30.75, 21.15))
        make_face(mode=Mode.SUBTRACT)
        with BuildLine():
            ThreePointArc((21.15, 24.75), (21.9434120658, 27.75), (21.15, 30.75))
            Line((21.15, 30.75), (23.75, 30.75))
            Line((23.75, 30.75), (23.75, 24.75))
            Line((23.75, 24.75), (21.15, 24.75))
        make_face(mode=Mode.SUBTRACT)
        with BuildLine():
            Line((15.875, 30.55), (15.875, 31.75))
            Line((15.875, 31.75), (0, 31.75))
            Line((0, 31.75), (0, 23.75))
            Line((0, 23.75), (15.875, 23.75))
            Line((15.875, 23.75), (15.875, 24.95))
            ThreePointArc((15.875, 24.95), (13.075, 27.75), (15.875, 30.55))
        make_face()
        with BuildLine():
            Line((8, 24.75), (8, 30.75))
            Line((8, 30.75), (10.6, 30.75))
            ThreePointArc((10.6, 30.75), (9.8065879342, 27.75), (10.6, 24.75))
            Line((10.6, 24.75), (8, 24.75))
        make_face(mode=Mode.SUBTRACT)
        with BuildLine():
            Line((31.75, -15.875), (31.75, 15.875))
            Line((31.75, 15.875), (30.55, 15.875))
            ThreePointArc((30.55, 15.875), (27.75, 13.075), (24.95, 15.875))
            Line((24.95, 15.875), (23.75, 15.875))
            Line((23.75, 15.875), (23.75, -15.875))
            Line((23.75, -15.875), (24.95, -15.875))
            ThreePointArc((24.95, -15.875), (27.75, -13.075), (30.55, -15.875))
            Line((30.55, -15.875), (31.75, -15.875))
        make_face()
        with BuildLine():
            ThreePointArc((30.75, -10.6), (27.75, -9.8065879342), (24.75, -10.6))
            Line((24.75, -10.6), (24.75, -8))
            Line((24.75, -8), (30.75, -8))
            Line((30.75, -8), (30.75, -10.6))
        make_face(mode=Mode.SUBTRACT)
        with BuildLine():
            Line((24.75, 8), (24.75, 10.6))
            ThreePointArc((24.75, 10.6), (27.75, 9.8065879342), (30.75, 10.6))
            Line((30.75, 10.6), (30.75, 8))
            Line((30.75, 8), (24.75, 8))
        make_face(mode=Mode.SUBTRACT)
        with BuildLine():
            Line((0, 23.75), (0, 31.75))
            Line((0, 31.75), (-15.875, 31.75))
            Line((-15.875, 31.75), (-15.875, 30.55))
            ThreePointArc((-15.875, 30.55), (-13.8951010127, 29.7298989873), (-13.075, 27.75))
            ThreePointArc((-13.075, 27.75), (-13.8951010127, 25.7701010127), (-15.875, 24.95))
            Line((-15.875, 24.95), (-15.875, 23.75))
            Line((-15.875, 23.75), (0, 23.75))
        make_face()
        with BuildLine():
            ThreePointArc((-10.6, 24.75), (-9.8065879342, 27.75), (-10.6, 30.75))
            Line((-10.6, 30.75), (-8, 30.75))
            Line((-8, 30.75), (-8, 24.75))
            Line((-8, 24.75), (-10.6, 24.75))
        make_face(mode=Mode.SUBTRACT)
        with BuildLine():
            Line((31.75, -31.75), (31.75, -15.875))
            Line((31.75, -15.875), (30.55, -15.875))
            ThreePointArc((30.55, -15.875), (27.75, -18.675), (24.95, -15.875))
            Line((24.95, -15.875), (23.75, -15.875))
            Line((23.75, -15.875), (23.75, -23.75))
            Line((23.75, -23.75), (15.875, -23.75))
            Line((15.875, -23.75), (15.875, -24.95))
            ThreePointArc((15.875, -24.95), (17.8548989873, -25.7701010127), (18.675, -27.75))
            ThreePointArc((18.675, -27.75), (17.8548989873, -29.7298989873), (15.875, -30.55))
            Line((15.875, -30.55), (15.875, -31.75))
            Line((15.875, -31.75), (31.75, -31.75))
        make_face()
        with BuildLine():
            Line((21.15, -24.75), (23.75, -24.75))
            Line((23.75, -24.75), (23.75, -30.75))
            Line((23.75, -30.75), (21.15, -30.75))
            ThreePointArc((21.15, -30.75), (21.9434120658, -27.75), (21.15, -24.75))
        make_face(mode=Mode.SUBTRACT)
        with BuildLine():
            Line((24.75, -23.75), (24.75, -21.15))
            ThreePointArc((24.75, -21.15), (27.75, -21.9434120658), (30.75, -21.15))
            Line((30.75, -21.15), (30.75, -23.75))
            Line((30.75, -23.75), (24.75, -23.75))
        make_face(mode=Mode.SUBTRACT)
        with BuildLine():
            Line((-15.875, 30.55), (-15.875, 31.75))
            Line((-15.875, 31.75), (-23.75, 31.75))
            Line((-23.75, 31.75), (-23.75, 30.75))
            Line((-23.75, 30.75), (-21.15, 30.75))
            ThreePointArc((-21.15, 30.75), (-21.9434120658, 27.75), (-21.15, 24.75))
            Line((-21.15, 24.75), (-23.75, 24.75))
            Line((-23.75, 24.75), (-23.75, 23.75))
            Line((-23.75, 23.75), (-15.875, 23.75))
            Line((-15.875, 23.75), (-15.875, 24.95))
            ThreePointArc((-15.875, 24.95), (-18.675, 27.75), (-15.875, 30.55))
        make_face()
        Polygon((-23.75, 30.75), (-23.75, 31.75), (-31.75, 31.75), (-31.75, 23.75), (-30.75, 23.75), (-24.75, 23.75), (-23.75, 23.75), (-23.75, 24.75), align=None)
        with BuildLine():
            Line((-15.875, -31.75), (15.875, -31.75))
            Line((15.875, -31.75), (15.875, -30.55))
            ThreePointArc((15.875, -30.55), (13.075, -27.75), (15.875, -24.95))
            Line((15.875, -24.95), (15.875, -23.75))
            Line((15.875, -23.75), (-15.875, -23.75))
            Line((-15.875, -23.75), (-15.875, -24.95))
            ThreePointArc((-15.875, -24.95), (-13.8951010127, -25.7701010127), (-13.075, -27.75))
            ThreePointArc((-13.075, -27.75), (-13.8951010127, -29.7298989873), (-15.875, -30.55))
            Line((-15.875, -30.55), (-15.875, -31.75))
        make_face()
        with BuildLine():
            Line((-8, -30.75), (-10.6, -30.75))
            ThreePointArc((-10.6, -30.75), (-9.8065879342, -27.75), (-10.6, -24.75))
            Line((-10.6, -24.75), (-8, -24.75))
            Line((-8, -24.75), (-8, -30.75))
        make_face(mode=Mode.SUBTRACT)
        with BuildLine():
            Line((8, -30.75), (8, -24.75))
            Line((8, -24.75), (10.6, -24.75))
            ThreePointArc((10.6, -24.75), (9.8065879342, -27.75), (10.6, -30.75))
            Line((10.6, -30.75), (8, -30.75))
        make_face(mode=Mode.SUBTRACT)
        with BuildLine():
            Line((-23.75, 15.875), (-23.75, 23.75))
            Line((-23.75, 23.75), (-24.75, 23.75))
            Line((-24.75, 23.75), (-24.75, 21.15))
            ThreePointArc((-24.75, 21.15), (-27.75, 21.9434120658), (-30.75, 21.15))
            Line((-30.75, 21.15), (-30.75, 23.75))
            Line((-30.75, 23.75), (-31.75, 23.75))
            Line((-31.75, 23.75), (-31.75, 15.875))
            Line((-31.75, 15.875), (-30.55, 15.875))
            ThreePointArc((-30.55, 15.875), (-27.75, 18.675), (-24.95, 15.875))
            Line((-24.95, 15.875), (-23.75, 15.875))
        make_face()
        with BuildLine():
            Line((-31.75, -31.75), (-15.875, -31.75))
            Line((-15.875, -31.75), (-15.875, -30.55))
            ThreePointArc((-15.875, -30.55), (-18.675, -27.75), (-15.875, -24.95))
            Line((-15.875, -24.95), (-15.875, -23.75))
            Line((-15.875, -23.75), (-23.75, -23.75))
            Line((-23.75, -23.75), (-23.75, -15.875))
            Line((-23.75, -15.875), (-24.95, -15.875))
            ThreePointArc((-24.95, -15.875), (-27.75, -18.675), (-30.55, -15.875))
            Line((-30.55, -15.875), (-31.75, -15.875))
            Line((-31.75, -15.875), (-31.75, -31.75))
        make_face()
        with BuildLine():
            Line((-23.75, -30.75), (-23.75, -24.75))
            Line((-23.75, -24.75), (-21.15, -24.75))
            ThreePointArc((-21.15, -24.75), (-21.9434120658, -27.75), (-21.15, -30.75))
            Line((-21.15, -30.75), (-23.75, -30.75))
        make_face(mode=Mode.SUBTRACT)
        with BuildLine():
            ThreePointArc((-30.75, -21.15), (-27.75, -21.9434120658), (-24.75, -21.15))
            Line((-24.75, -21.15), (-24.75, -23.75))
            Line((-24.75, -23.75), (-30.75, -23.75))
            Line((-30.75, -23.75), (-30.75, -21.15))
        make_face(mode=Mode.SUBTRACT)
        with BuildLine():
            Line((-23.75, -15.875), (-23.75, 15.875))
            Line((-23.75, 15.875), (-24.95, 15.875))
            ThreePointArc((-24.95, 15.875), (-27.75, 13.075), (-30.55, 15.875))
            Line((-30.55, 15.875), (-31.75, 15.875))
            Line((-31.75, 15.875), (-31.75, -15.875))
            Line((-31.75, -15.875), (-30.55, -15.875))
            ThreePointArc((-30.55, -15.875), (-27.75, -13.075), (-24.95, -15.875))
            Line((-24.95, -15.875), (-23.75, -15.875))
        make_face()
        with BuildLine():
            Line((-24.75, -8), (-24.75, -10.6))
            ThreePointArc((-24.75, -10.6), (-27.75, -9.8065879342), (-30.75, -10.6))
            Line((-30.75, -10.6), (-30.75, -8))
            Line((-30.75, -8), (-24.75, -8))
        make_face(mode=Mode.SUBTRACT)
        with BuildLine():
            ThreePointArc((-30.75, 10.6), (-27.75, 9.8065879342), (-24.75, 10.6))
            Line((-24.75, 10.6), (-24.75, 8))
            Line((-24.75, 8), (-30.75, 8))
            Line((-30.75, 8), (-30.75, 10.6))
        make_face(mode=Mode.SUBTRACT)
        Circle(F0_R)
    extrude(amount=F2_DEPTH)


solid = f1.part
